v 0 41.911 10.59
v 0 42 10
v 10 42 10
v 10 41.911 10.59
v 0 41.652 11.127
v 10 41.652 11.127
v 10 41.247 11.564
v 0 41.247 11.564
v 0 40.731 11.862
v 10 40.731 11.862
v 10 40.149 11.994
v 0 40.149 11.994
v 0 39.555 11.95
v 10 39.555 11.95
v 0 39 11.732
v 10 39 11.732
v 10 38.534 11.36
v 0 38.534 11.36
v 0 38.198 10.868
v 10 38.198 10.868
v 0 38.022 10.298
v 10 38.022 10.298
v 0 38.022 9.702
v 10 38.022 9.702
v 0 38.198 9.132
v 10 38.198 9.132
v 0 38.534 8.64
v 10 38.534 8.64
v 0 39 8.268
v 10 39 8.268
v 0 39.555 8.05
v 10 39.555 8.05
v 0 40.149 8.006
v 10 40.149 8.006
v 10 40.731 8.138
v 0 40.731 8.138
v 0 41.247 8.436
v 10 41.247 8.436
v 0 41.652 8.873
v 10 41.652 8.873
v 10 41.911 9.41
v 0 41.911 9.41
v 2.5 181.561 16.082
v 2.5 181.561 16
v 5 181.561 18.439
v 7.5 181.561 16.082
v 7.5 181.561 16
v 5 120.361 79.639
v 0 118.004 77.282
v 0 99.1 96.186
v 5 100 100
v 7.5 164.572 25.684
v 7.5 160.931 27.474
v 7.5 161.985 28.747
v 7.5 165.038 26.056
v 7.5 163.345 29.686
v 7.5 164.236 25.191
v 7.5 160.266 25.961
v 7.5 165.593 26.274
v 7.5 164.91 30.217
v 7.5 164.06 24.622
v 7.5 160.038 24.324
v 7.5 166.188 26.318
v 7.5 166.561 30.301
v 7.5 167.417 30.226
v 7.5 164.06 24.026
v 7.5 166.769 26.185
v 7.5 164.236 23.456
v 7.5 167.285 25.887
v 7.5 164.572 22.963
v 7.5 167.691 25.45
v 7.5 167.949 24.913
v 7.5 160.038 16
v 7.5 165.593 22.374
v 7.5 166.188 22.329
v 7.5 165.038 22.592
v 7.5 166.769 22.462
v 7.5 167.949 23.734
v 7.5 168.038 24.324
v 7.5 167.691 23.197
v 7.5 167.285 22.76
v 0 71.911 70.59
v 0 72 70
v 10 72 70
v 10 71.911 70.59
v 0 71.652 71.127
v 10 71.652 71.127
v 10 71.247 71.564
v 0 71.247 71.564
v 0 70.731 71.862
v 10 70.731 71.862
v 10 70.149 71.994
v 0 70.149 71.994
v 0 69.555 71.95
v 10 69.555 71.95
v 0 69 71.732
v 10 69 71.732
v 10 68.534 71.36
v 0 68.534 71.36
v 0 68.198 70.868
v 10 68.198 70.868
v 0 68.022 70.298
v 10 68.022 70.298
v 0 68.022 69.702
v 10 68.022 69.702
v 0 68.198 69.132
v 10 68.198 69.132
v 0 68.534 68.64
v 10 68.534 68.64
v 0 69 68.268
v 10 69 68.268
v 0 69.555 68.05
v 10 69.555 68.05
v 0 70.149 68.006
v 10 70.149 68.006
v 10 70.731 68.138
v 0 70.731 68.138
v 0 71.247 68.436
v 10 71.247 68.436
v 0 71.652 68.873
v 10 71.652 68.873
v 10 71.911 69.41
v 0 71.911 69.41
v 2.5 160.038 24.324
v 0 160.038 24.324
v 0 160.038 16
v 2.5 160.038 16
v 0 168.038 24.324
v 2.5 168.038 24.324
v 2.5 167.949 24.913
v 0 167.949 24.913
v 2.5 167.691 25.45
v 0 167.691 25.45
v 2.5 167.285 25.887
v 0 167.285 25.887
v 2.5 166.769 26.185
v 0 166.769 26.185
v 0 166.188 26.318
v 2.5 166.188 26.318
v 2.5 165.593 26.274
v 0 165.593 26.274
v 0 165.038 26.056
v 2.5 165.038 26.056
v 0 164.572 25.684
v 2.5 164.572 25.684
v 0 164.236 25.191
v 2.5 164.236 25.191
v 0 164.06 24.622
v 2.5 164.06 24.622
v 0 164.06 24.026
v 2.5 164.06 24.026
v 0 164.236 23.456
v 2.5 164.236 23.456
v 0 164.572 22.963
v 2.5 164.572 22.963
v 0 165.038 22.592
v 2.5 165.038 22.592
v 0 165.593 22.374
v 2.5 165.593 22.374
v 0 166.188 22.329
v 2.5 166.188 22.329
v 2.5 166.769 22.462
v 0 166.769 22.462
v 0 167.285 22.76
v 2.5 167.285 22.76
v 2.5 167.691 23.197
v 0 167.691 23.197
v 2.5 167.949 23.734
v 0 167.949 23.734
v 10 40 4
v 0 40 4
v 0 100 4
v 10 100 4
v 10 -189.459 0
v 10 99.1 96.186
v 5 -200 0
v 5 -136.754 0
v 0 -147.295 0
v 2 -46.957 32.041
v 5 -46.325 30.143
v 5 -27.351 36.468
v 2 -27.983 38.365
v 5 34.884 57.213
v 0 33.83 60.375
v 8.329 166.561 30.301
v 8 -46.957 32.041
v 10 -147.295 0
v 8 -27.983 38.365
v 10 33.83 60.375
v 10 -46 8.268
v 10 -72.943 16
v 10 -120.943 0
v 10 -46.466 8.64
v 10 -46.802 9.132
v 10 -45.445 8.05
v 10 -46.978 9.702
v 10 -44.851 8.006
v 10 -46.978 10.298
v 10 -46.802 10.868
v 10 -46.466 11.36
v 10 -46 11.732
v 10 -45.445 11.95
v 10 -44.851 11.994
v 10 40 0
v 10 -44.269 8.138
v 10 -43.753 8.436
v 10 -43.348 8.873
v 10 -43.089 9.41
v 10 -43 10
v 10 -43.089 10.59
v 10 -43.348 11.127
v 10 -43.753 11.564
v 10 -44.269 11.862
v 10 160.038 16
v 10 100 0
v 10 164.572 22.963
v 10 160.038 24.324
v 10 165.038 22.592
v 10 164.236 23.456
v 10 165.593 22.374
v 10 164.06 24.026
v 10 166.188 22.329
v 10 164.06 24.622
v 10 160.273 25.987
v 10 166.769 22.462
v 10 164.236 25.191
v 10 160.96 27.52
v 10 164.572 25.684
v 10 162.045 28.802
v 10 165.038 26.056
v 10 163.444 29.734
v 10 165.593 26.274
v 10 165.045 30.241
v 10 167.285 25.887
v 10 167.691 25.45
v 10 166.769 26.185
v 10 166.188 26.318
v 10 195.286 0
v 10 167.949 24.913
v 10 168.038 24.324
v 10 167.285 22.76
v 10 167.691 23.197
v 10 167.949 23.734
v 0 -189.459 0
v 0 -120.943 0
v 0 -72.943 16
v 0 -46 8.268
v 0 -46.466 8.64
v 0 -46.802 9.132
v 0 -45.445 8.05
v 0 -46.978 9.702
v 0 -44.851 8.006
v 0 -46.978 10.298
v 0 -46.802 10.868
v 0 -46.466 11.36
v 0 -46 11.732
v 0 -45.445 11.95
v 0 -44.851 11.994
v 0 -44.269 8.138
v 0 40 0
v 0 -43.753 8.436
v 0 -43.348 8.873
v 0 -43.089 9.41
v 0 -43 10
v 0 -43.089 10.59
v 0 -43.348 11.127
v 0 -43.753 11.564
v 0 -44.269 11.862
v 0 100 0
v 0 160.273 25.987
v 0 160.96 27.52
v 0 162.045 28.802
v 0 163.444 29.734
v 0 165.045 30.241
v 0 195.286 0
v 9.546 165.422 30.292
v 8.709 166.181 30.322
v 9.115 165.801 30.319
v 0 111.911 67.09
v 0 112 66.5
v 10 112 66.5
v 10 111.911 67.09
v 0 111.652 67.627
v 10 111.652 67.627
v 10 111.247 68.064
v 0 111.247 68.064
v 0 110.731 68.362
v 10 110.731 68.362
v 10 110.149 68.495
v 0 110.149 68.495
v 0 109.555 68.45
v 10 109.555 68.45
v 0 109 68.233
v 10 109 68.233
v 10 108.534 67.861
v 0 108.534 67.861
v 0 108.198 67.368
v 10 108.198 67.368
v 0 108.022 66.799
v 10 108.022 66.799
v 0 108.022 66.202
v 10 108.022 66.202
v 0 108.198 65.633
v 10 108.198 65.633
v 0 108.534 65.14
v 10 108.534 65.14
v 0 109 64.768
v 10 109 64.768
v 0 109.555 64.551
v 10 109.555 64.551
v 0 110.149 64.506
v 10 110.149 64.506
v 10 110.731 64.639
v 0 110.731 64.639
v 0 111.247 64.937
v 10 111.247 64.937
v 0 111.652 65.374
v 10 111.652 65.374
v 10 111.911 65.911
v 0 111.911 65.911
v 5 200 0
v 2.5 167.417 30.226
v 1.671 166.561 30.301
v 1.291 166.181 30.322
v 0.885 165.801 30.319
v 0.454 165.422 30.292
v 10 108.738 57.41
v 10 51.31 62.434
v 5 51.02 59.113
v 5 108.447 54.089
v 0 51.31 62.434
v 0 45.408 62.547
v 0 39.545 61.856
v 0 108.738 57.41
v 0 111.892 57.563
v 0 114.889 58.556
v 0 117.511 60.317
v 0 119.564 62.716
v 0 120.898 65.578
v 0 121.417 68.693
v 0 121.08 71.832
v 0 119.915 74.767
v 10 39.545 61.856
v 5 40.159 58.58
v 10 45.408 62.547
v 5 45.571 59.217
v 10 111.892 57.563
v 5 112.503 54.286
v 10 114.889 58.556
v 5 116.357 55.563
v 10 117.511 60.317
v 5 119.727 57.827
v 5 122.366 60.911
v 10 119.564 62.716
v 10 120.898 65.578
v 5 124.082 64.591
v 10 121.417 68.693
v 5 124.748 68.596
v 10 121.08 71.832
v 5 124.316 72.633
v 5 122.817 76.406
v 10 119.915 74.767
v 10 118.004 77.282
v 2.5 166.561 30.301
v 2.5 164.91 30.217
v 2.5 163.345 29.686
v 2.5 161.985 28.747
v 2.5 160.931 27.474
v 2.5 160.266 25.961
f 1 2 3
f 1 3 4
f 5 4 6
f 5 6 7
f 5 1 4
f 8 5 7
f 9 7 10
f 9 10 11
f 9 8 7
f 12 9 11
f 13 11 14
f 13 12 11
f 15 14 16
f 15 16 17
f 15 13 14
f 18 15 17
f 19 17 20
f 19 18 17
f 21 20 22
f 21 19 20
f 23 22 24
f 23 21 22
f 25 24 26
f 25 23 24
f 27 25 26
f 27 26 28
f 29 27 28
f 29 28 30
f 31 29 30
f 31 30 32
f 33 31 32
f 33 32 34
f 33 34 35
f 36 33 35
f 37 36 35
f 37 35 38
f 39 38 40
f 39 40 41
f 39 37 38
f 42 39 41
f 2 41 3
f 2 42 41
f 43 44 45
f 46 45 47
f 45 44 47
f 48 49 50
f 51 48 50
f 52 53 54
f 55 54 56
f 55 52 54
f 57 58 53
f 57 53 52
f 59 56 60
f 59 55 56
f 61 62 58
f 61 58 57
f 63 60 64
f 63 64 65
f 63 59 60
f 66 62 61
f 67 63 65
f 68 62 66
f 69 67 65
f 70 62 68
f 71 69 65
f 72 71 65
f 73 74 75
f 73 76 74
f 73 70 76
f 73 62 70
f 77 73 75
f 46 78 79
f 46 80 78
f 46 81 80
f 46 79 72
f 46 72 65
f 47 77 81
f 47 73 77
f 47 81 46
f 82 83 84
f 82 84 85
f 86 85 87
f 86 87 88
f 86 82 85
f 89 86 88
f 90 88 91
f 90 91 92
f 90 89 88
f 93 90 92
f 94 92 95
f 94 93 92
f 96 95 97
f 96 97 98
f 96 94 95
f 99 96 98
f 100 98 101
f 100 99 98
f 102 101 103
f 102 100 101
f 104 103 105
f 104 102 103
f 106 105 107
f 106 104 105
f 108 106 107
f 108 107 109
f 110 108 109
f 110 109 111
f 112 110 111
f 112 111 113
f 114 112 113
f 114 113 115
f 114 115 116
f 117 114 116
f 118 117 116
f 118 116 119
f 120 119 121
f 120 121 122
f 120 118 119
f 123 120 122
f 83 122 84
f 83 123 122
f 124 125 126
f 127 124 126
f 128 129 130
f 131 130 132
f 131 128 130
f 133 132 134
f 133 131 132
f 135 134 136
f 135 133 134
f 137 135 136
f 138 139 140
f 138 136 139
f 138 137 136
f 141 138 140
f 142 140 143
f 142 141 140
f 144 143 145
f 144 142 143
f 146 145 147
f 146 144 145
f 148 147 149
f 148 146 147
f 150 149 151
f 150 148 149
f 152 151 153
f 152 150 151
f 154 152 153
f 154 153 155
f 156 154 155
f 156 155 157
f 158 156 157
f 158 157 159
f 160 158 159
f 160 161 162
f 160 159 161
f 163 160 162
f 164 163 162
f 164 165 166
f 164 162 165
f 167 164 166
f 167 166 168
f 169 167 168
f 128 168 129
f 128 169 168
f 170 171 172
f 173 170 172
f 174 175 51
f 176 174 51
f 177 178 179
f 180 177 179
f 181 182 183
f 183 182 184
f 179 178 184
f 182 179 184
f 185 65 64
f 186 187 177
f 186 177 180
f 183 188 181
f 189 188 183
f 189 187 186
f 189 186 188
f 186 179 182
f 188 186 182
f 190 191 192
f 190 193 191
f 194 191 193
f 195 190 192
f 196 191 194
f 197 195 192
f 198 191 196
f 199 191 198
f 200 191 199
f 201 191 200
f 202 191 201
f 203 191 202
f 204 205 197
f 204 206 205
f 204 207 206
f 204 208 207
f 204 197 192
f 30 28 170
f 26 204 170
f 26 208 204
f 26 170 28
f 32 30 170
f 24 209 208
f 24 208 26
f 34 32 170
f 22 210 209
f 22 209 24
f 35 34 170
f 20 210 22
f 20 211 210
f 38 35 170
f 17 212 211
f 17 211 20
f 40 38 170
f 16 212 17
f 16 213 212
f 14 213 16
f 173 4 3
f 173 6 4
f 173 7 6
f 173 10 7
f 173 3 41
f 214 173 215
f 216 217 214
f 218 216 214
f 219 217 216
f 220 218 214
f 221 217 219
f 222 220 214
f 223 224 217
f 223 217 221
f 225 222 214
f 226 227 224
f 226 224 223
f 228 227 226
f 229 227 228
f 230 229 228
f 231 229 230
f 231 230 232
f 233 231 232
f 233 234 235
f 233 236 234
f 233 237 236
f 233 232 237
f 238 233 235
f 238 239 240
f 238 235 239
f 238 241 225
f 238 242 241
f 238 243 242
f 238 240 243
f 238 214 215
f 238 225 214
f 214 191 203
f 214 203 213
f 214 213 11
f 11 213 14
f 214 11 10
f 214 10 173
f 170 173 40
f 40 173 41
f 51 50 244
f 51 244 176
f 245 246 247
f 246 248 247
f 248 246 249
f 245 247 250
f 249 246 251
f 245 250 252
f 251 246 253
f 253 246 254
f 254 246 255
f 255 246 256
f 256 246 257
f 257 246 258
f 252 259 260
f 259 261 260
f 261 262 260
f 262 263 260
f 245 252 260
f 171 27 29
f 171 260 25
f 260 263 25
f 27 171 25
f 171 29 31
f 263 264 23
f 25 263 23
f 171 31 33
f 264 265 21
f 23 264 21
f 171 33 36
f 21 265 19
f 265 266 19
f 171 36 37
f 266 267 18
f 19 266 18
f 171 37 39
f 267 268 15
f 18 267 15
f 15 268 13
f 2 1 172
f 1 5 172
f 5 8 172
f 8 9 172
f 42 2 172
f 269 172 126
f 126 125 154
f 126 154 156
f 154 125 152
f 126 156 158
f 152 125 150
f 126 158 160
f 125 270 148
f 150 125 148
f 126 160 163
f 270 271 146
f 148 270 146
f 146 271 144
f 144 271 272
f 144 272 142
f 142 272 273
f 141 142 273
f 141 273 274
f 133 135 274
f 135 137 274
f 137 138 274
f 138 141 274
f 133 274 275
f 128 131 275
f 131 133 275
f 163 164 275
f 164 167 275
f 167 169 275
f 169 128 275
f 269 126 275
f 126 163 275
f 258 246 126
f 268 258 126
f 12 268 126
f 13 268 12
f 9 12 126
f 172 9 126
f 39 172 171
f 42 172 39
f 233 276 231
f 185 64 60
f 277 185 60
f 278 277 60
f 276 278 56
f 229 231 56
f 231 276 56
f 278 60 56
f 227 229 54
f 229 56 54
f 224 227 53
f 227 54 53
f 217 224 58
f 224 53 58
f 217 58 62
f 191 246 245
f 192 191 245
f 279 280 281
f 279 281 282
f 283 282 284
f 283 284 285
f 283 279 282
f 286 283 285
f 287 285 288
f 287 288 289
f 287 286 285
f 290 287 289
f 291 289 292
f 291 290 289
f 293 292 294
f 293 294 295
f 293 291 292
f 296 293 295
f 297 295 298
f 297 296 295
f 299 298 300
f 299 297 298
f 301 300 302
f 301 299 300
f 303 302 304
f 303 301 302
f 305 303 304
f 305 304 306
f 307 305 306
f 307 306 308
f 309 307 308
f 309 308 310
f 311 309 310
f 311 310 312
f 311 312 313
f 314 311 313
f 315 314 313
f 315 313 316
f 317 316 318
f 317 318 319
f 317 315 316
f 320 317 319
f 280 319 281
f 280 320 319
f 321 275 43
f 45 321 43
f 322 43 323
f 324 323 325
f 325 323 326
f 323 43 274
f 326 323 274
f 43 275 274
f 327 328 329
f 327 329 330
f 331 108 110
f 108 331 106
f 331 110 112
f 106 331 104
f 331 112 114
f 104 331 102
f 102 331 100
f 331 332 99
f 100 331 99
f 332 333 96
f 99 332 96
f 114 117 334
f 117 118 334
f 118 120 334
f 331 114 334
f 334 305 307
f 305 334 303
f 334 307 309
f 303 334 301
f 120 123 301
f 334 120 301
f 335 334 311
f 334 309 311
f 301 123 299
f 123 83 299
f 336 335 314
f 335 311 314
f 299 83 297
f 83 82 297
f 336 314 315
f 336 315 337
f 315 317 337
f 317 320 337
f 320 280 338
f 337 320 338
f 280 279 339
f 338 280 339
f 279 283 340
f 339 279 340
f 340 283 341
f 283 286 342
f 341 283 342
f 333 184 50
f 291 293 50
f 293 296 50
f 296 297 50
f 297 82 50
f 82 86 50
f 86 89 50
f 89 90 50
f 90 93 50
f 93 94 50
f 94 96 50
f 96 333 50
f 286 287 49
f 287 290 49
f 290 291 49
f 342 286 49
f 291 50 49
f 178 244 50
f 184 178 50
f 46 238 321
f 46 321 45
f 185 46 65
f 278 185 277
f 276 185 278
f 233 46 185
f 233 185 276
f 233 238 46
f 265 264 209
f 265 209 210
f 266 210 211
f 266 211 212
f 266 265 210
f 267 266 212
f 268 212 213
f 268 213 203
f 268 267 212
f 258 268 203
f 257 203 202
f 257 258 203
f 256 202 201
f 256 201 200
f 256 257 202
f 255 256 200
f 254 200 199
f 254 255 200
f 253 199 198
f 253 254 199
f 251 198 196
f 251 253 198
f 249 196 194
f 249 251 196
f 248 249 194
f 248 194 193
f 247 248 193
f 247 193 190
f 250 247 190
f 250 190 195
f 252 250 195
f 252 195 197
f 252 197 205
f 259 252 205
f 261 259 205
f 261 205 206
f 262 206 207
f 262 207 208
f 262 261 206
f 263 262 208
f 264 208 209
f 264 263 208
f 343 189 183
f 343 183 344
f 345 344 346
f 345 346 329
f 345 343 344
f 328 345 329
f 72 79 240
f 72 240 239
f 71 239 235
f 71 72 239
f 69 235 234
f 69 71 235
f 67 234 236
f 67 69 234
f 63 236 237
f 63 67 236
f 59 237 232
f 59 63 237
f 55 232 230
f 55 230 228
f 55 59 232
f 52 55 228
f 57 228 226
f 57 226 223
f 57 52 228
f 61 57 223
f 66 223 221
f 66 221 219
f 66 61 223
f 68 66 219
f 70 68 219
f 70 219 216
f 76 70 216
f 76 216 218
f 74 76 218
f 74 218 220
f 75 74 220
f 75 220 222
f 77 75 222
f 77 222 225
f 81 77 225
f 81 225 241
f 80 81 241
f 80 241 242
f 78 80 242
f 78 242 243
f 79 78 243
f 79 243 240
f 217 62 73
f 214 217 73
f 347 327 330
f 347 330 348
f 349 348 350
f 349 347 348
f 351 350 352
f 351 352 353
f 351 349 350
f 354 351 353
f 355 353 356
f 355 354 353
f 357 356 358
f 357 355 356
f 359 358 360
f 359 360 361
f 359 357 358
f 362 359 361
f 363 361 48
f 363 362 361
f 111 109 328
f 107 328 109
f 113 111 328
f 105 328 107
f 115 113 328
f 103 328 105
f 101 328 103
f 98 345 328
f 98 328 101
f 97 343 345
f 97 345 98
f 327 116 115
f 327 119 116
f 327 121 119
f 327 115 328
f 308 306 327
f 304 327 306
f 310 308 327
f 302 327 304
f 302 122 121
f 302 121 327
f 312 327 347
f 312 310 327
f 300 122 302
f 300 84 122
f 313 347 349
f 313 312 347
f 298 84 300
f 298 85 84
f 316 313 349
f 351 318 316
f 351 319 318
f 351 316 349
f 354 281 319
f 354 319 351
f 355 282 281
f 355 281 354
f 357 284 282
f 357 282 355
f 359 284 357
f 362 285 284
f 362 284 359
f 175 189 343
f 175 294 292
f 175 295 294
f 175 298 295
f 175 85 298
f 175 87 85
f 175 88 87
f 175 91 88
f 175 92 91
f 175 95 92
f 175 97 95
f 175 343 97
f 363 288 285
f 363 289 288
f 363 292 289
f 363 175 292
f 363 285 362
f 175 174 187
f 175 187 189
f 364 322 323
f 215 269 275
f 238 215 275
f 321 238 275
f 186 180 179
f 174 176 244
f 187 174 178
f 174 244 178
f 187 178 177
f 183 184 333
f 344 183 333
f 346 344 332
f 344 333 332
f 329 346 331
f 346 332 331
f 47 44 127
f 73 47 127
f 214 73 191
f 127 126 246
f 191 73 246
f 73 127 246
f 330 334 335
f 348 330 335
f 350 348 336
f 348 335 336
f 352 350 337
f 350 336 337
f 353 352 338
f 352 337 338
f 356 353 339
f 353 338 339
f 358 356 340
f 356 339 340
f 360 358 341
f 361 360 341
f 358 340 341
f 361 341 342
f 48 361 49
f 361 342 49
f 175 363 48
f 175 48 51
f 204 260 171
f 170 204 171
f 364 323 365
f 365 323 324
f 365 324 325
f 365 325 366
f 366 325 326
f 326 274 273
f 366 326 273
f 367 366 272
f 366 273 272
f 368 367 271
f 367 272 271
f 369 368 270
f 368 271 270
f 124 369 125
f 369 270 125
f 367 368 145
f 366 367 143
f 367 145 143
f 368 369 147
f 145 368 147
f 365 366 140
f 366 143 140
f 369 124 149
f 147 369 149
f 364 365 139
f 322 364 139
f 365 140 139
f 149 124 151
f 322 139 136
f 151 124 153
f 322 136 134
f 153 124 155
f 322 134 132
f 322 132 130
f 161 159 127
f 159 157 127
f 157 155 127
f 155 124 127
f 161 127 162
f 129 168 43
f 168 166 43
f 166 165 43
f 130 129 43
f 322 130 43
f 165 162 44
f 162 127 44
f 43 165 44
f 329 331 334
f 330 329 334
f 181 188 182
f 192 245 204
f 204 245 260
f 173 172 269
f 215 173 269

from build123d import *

# Parameters (mm, degrees)
F0_R     = 2
F1_DEPTH = 10
F2_DEPTH = 10
F3_SIZE2 = 3.3333333338
F3_SIZE  = 5
F4_SIZE2 = 3.333323
F4_SIZE  = 4.99999
F5_SIZE2 = 3.333323
F5_SIZE  = 4.99999
F6_SIZE2 = 3.333323
F6_SIZE  = 4.99999
F7_W     = 5
F7_H     = 30
F8_DEPTH = 25


# Not quite as in the source:
# - a fillet or chamfer is up to 0.001 mm smaller than in the source, because OpenCascade refuses the exact size


with BuildPart() as f1:
    # F0 (on Right) → F1 (new body)
    with BuildSketch(Plane.YZ):
        with BuildLine():
            Line((120.3614303264, 79.6385696736), (100, 100))
            Line((100, 100), (-200, 0))
            Line((-200, 0), (-136.7544467966, 0))
            Line((-136.7544467966, 0), (-46.3245553203, 30.1432971588))
            Line((-46.3245553203, 30.1432971588), (-46.9570108524, 32.0406637549))
            Line((-46.9570108524, 32.0406637549), (-27.9833448914, 38.3652190752))
            Line((-27.9833448914, 38.3652190752), (-27.3508893593, 36.4678524791))
            Line((-27.3508893593, 36.4678524791), (34.884209498, 57.2128854315))
            ThreePointArc((34.884209498, 57.2128854315), (42.8543747456, 58.9909543257), (51.0195498486, 59.1133414332))
            Line((51.0195498486, 59.1133414332), (108.4474924674, 54.0890474844))
            ThreePointArc((108.4474924674, 54.0890474844), (123.3494454141, 62.6926940297), (120.3614303264, 79.6385696736))
        make_face()
        with Locations((70, 70)):
            Circle(F0_R, mode=Mode.SUBTRACT)
        with Locations((110, 66.500453459)):
            Circle(F0_R, mode=Mode.SUBTRACT)
    extrude(amount=F1_DEPTH)

    # F3
    f3_edges = [f1.edges().sort_by_distance(p)[0] for p in [
        (10, -50, 50),
    ]]
    f3_side = f1.faces().sort_by_distance((5, -50, 50))[0]
    chamfer(f3_edges, length=F3_SIZE, length2=F3_SIZE2, reference=f3_side)

    # F4 (size 5 and 3.3333333338 in the source; OpenCascade refuses exactly that, so slightly less here)
    f4_edges = [f1.edges().sort_by_distance(p)[0] for p in [
        (0, -50, 50),
    ]]
    f4_side = f1.faces().sort_by_distance((2.5, -50, 50))[0]
    chamfer(f4_edges, length=F4_SIZE, length2=F4_SIZE2, reference=f4_side)

    # F5 (size 5 and 3.3333333338 in the source; OpenCascade refuses exactly that, so slightly less here)
    f5_edges = [f1.edges().sort_by_distance(p)[0] for p in [
        (0, 111.498327, 88.501673),
        (10, 111.498331, 88.501669),
    ]]
    f5_side = f1.faces().sort_by_distance((5, 110.824327, 89.175673))[0]
    chamfer(f5_edges, length=F5_SIZE, length2=F5_SIZE2, reference=f5_side)


with BuildPart() as f2:
    # F0 (on Right) → F2 (new body)
    with BuildSketch(Plane.YZ):
        with BuildLine():
            Line((-72.9430584958, 16), (-120.9430584958, 0))
            Line((-120.9430584958, 0), (40, 0))
            Line((40, 0), (40, 4))
            Line((40, 4), (100, 4))
            Line((100, 4), (100, 0))
            Line((100, 0), (200, 0))
            Line((200, 0), (170, 30))
            Line((170, 30), (166.5609874756, 30.3008746096))
            ThreePointArc((166.5609874756, 30.3008746096), (161.9845117734, 28.7473704419), (160.0380530191, 24.3237064211))
            Line((160.0380530191, 24.3237064211), (160.0380530191, 16))
            Line((160.0380530191, 16), (-72.9430584958, 16))
        make_face()
        with Locations((-45, 10)):
            Circle(F0_R, mode=Mode.SUBTRACT)
        with Locations((40, 10)):
            Circle(F0_R, mode=Mode.SUBTRACT)
        with Locations((166.0380530191, 24.3237064211)):
            Circle(F0_R, mode=Mode.SUBTRACT)
    extrude(amount=F2_DEPTH)

    # F6 (size 5 and 3.3333333338 in the source; OpenCascade refuses exactly that, so slightly less here)
    f6_edges = [f2.edges().sort_by_distance(p)[0] for p in [
        (0, 185, 15),
        (10, 185, 15),
    ]]
    f6_side = f2.faces().sort_by_distance((5, 185, 15))[0]
    chamfer(f6_edges, length=F6_SIZE, length2=F6_SIZE2, reference=f6_side)

    # F7 (on face) → F8 (cut)
    with BuildSketch(Plane.XY.offset(16)):
        with Locations((5, 166.5609874756)):
            Rectangle(F7_W, F7_H)
    extrude(amount=F8_DEPTH, mode=Mode.SUBTRACT)


solid = Compound([f1.part, f2.part])
